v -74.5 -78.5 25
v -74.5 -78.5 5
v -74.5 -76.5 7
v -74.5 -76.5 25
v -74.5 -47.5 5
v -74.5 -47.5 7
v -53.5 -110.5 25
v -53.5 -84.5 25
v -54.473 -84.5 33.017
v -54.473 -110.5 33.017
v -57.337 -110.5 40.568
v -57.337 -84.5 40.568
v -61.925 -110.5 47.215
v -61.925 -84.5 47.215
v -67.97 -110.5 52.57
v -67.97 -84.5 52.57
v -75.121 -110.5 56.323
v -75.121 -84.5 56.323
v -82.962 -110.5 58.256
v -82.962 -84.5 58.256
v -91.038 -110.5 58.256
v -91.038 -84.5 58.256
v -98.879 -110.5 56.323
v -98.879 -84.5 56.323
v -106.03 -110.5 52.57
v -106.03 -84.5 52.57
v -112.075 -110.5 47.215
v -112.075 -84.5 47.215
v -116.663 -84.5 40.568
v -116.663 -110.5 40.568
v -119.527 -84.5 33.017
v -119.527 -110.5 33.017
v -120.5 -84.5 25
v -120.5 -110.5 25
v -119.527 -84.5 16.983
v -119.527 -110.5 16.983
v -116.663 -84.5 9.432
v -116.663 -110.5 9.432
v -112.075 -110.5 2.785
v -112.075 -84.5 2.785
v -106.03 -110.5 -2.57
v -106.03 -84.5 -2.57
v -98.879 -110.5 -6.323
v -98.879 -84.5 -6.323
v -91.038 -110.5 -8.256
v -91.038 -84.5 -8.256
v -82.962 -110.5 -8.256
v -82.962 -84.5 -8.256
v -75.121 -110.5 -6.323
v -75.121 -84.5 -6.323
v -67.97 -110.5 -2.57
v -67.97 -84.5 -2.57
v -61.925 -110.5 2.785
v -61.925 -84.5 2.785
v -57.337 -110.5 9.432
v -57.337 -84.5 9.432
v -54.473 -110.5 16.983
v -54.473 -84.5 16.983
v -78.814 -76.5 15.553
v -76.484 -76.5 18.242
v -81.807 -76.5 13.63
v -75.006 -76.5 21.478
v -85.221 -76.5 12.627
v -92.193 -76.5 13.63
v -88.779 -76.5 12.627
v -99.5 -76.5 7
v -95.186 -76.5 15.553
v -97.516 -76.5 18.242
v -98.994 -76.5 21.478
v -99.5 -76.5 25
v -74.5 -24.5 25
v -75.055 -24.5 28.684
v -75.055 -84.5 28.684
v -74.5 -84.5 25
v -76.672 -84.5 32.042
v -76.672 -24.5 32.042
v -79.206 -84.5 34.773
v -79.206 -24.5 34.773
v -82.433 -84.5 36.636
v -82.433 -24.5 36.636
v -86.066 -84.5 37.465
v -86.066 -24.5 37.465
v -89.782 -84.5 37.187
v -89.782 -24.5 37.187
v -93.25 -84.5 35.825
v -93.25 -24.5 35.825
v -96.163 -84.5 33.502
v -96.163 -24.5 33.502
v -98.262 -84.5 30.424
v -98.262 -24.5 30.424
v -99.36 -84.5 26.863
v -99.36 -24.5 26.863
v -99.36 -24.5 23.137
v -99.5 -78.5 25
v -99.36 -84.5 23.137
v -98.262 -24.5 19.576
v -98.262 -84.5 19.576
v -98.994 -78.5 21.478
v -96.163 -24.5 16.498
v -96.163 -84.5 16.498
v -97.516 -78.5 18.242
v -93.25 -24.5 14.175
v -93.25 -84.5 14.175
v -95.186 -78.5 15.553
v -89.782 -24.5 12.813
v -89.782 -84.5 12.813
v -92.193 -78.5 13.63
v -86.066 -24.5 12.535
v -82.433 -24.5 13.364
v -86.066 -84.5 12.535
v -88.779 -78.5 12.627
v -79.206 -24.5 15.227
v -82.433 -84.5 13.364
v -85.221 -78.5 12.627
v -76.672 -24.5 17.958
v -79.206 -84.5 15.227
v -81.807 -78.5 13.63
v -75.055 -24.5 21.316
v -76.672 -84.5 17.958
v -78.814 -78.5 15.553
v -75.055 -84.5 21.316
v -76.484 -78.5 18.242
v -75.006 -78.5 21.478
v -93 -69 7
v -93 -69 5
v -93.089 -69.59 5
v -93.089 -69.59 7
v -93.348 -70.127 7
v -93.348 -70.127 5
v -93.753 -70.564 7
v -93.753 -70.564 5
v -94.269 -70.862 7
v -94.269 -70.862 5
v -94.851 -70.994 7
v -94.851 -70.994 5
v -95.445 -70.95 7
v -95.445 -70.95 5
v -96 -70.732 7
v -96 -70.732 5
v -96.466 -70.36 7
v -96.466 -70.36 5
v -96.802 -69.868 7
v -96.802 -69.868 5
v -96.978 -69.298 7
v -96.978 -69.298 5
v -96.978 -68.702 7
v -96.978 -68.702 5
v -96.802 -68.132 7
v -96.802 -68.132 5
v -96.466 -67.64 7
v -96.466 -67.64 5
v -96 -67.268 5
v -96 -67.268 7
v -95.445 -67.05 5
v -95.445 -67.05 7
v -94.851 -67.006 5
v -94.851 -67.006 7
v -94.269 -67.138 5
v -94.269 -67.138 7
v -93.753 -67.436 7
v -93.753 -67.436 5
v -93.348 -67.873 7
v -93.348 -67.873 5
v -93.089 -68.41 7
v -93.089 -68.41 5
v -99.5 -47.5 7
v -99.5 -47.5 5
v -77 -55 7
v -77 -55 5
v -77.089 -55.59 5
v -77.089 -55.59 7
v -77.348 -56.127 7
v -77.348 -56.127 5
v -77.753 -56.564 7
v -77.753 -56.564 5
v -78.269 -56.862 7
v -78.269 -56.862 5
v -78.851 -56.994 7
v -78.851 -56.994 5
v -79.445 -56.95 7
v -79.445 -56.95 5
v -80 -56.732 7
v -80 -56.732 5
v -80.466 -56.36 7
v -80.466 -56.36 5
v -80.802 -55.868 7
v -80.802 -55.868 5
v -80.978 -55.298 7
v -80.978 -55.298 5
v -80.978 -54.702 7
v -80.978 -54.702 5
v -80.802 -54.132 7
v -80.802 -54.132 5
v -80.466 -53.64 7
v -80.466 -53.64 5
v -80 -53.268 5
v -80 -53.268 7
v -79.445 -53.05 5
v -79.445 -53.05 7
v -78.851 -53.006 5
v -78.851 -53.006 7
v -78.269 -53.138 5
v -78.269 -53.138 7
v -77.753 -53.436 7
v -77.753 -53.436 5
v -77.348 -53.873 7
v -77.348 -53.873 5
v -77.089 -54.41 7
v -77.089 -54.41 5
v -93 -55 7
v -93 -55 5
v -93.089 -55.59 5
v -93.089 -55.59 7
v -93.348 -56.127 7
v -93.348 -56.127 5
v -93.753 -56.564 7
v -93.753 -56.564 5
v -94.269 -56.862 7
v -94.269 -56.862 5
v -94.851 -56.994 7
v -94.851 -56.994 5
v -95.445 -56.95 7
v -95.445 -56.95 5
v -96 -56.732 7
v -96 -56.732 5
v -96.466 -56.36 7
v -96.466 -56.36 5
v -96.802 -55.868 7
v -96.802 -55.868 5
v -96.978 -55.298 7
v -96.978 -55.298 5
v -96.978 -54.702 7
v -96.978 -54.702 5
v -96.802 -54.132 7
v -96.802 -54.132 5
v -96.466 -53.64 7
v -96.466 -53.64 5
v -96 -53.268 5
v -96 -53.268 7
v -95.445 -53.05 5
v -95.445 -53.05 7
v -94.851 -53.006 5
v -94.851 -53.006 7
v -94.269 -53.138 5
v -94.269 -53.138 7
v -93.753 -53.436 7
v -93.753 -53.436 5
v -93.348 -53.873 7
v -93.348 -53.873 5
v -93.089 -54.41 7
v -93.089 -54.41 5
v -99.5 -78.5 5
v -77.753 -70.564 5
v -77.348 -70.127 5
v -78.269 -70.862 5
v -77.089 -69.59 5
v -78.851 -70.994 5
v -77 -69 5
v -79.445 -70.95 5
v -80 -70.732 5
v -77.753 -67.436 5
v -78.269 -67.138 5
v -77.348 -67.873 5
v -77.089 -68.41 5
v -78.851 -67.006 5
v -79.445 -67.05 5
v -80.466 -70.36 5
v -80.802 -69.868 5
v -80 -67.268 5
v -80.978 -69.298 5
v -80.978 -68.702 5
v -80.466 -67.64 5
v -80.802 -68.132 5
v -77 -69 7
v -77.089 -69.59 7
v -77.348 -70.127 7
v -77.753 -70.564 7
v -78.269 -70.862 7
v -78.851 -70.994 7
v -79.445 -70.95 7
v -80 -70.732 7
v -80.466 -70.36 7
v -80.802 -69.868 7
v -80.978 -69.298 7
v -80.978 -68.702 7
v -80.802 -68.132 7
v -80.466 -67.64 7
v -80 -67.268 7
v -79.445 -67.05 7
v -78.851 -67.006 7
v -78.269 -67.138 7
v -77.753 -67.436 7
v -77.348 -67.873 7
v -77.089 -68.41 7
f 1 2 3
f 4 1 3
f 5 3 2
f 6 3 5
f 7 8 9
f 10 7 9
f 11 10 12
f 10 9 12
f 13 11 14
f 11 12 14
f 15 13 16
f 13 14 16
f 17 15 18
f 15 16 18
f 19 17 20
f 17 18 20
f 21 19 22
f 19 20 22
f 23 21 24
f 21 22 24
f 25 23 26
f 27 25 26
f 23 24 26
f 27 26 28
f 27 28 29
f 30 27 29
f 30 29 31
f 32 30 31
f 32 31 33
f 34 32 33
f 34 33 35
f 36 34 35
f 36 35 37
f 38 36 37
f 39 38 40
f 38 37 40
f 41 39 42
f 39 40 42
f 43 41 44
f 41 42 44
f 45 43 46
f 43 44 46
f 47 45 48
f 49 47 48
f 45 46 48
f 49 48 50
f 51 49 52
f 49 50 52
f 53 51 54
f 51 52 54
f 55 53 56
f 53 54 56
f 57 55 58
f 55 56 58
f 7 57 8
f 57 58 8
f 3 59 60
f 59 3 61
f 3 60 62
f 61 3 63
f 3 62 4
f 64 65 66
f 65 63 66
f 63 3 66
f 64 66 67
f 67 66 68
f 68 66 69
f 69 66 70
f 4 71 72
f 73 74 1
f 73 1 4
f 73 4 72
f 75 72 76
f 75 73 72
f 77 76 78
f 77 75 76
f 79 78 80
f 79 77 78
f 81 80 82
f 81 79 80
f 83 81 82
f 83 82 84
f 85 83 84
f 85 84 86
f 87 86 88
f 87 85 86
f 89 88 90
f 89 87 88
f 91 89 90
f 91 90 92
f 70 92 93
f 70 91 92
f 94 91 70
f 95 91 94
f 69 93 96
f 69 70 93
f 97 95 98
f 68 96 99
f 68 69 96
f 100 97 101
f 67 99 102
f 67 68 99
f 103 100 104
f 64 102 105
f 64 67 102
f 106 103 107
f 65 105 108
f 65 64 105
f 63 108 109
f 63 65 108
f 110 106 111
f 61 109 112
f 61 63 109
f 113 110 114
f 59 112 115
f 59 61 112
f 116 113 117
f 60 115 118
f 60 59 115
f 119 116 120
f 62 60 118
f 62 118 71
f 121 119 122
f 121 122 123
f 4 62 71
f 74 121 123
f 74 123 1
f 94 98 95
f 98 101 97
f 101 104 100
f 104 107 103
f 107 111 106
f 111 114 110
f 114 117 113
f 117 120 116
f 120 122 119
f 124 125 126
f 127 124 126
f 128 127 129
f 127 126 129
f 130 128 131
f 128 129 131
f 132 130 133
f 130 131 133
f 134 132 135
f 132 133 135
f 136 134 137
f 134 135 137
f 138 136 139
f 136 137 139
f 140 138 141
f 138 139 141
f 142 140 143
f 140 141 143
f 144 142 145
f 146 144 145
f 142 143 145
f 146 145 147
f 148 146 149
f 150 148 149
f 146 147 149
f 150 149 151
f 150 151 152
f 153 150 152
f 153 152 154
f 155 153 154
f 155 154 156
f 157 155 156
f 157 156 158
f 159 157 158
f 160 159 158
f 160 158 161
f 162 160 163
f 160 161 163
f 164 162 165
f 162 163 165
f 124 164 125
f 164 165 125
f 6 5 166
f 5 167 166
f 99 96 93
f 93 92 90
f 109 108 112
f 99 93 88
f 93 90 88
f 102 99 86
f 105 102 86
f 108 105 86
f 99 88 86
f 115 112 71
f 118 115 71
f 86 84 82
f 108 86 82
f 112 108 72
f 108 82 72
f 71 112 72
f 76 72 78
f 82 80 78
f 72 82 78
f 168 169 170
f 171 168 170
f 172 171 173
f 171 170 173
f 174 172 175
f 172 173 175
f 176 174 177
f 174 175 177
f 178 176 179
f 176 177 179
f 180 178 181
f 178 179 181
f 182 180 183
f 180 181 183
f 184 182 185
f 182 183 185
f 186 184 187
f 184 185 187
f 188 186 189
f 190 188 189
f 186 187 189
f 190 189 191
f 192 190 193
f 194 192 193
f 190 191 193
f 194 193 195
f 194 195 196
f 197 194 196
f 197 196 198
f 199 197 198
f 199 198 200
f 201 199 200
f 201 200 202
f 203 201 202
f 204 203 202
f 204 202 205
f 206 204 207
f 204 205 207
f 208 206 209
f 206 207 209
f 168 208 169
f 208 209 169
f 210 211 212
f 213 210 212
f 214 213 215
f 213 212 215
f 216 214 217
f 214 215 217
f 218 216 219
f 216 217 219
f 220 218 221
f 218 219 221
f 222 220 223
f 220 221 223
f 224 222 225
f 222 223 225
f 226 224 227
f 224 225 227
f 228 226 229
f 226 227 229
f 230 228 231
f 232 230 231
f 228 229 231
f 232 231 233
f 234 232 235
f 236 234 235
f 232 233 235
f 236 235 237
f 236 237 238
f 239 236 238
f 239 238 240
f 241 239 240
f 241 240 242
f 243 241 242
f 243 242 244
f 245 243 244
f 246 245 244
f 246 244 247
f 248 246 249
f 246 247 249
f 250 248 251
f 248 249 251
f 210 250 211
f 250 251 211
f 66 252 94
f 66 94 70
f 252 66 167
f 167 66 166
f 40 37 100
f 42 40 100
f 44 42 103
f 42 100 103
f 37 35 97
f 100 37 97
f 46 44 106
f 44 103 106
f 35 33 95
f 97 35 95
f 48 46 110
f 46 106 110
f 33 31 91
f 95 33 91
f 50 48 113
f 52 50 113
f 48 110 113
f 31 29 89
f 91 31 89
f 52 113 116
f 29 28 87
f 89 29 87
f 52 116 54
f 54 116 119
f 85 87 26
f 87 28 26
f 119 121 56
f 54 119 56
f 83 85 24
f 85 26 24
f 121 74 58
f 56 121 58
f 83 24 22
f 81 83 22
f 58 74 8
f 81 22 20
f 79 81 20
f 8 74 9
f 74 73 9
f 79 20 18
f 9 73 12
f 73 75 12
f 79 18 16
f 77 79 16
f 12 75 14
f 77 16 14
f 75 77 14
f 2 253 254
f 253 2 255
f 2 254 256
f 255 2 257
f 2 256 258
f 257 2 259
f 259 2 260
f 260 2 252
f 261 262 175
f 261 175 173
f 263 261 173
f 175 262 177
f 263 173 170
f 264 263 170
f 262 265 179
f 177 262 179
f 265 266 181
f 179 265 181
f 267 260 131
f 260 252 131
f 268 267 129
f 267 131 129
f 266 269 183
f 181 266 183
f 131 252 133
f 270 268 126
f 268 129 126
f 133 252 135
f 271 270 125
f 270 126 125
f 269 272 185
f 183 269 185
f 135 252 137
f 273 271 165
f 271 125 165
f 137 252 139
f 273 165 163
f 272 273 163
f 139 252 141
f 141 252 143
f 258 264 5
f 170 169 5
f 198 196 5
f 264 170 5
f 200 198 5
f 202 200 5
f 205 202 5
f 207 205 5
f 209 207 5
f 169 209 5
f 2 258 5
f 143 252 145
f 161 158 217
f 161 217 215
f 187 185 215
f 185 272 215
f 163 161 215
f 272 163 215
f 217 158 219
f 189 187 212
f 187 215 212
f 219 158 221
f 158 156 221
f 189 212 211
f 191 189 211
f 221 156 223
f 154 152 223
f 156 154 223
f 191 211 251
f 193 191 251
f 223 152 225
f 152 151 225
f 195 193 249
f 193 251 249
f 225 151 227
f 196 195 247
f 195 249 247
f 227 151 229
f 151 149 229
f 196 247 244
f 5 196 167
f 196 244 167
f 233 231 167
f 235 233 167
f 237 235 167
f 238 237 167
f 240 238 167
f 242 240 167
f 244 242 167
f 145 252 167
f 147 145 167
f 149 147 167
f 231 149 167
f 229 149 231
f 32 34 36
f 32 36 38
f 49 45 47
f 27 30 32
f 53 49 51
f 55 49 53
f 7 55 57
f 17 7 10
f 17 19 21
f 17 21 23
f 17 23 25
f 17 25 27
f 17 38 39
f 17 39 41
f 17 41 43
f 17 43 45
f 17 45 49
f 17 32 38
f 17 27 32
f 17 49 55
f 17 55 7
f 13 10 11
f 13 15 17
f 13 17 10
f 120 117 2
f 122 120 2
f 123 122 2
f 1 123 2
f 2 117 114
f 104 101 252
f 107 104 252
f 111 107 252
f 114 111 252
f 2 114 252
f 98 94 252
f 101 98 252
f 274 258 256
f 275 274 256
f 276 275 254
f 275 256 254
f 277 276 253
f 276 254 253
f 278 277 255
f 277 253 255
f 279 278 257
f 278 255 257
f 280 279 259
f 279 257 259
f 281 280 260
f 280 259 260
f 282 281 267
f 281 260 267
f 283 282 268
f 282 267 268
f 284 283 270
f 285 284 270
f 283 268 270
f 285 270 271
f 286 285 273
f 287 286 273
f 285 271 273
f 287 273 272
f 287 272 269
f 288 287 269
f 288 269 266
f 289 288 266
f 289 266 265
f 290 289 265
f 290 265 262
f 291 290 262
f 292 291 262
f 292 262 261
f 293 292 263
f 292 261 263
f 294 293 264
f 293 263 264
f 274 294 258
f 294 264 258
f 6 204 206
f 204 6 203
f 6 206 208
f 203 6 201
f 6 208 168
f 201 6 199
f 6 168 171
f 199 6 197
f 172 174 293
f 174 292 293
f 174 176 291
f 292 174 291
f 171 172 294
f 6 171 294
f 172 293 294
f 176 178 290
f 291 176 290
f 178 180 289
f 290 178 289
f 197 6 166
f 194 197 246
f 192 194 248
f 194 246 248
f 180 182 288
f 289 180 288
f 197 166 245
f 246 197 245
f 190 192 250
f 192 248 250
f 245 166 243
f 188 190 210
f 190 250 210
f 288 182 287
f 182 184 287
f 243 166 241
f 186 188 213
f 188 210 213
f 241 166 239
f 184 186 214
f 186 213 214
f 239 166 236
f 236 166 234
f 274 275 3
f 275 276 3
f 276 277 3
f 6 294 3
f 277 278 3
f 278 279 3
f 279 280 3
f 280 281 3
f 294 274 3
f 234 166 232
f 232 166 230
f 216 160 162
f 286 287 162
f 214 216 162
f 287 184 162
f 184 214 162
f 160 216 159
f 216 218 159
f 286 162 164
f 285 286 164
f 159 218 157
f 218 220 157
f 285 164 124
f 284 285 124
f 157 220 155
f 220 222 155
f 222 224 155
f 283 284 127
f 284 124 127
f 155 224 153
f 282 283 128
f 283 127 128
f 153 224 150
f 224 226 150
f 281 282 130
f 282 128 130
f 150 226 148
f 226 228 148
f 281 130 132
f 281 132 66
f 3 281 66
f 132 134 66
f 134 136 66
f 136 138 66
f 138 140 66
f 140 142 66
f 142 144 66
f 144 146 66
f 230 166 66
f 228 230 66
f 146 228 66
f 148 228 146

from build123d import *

# Parameters (mm, degrees)
SKETCH002_R             = 33.5
PAD002_DEPTH            = 26
SKETCH003_R             = 12.5
PAD003_DEPTH            = 60
PAD004_DEPTH            = 12.5
POCKET_DEPTH            = 10
SKETCH024_R             = 2
POCKET007_DEPTH         = 2
BODY002_PLACEMENT_ANGLE = 270


with BuildPart() as part:
    # Sketch002 → Pad002 (new body)
    with BuildSketch(Plane.YZ):
        Circle(SKETCH002_R)
    extrude(amount=PAD002_DEPTH)

    # Sketch003 → Pad003 (join)
    with BuildSketch(Plane.YZ):
        Circle(SKETCH003_R)
    extrude(amount=-PAD003_DEPTH)

    # Sketch004 → Pad004 (join, symmetric)
    with BuildSketch(Plane.XZ):
        Polygon((-6, 12.5), (-6, -20), (-37, -20), (-37, -18), (-8, -18), (-8, 12.5), align=None)
    extrude(amount=PAD004_DEPTH, both=True)

    # Sketch005 → Pocket (cut)
    with BuildSketch(Plane.YZ):
        with BuildLine():
            ThreePointArc((12.5, 0), (0, 12.5), (-12.5, 0))
            Line((-13.5, 0), (-12.5, 0))
            Line((-13.5, 13.5), (-13.5, 0))
            Line((13.5, 13.5), (-13.5, 13.5))
            Line((13.5, 0), (13.5, 13.5))
            Line((12.5, 0), (13.5, 0))
        make_face()
    extrude(amount=-POCKET_DEPTH, mode=Mode.SUBTRACT)

    # Sketch024 (on Face11 of Pocket) → Pocket007 (cut)
    with BuildSketch(Plane.YX.offset(20)):
        with Locations((8, -15.5)):
            Circle(SKETCH024_R)
        with Locations((-8, -15.5)):
            Circle(SKETCH024_R)
        with Locations((-8, -29.5)):
            Circle(SKETCH024_R)
        with Locations((8, -29.5)):
            Circle(SKETCH024_R)
    extrude(amount=-POCKET007_DEPTH, mode=Mode.SUBTRACT)


with BuildPart() as part_1:
    # Body002 placement: moved
    add(part.part.moved(Location((-87, -84.5, 25))).rotate(Axis((-87, -84.5, 25), (0, 0, 1)), BODY002_PLACEMENT_ANGLE))


solid = part_1.part
